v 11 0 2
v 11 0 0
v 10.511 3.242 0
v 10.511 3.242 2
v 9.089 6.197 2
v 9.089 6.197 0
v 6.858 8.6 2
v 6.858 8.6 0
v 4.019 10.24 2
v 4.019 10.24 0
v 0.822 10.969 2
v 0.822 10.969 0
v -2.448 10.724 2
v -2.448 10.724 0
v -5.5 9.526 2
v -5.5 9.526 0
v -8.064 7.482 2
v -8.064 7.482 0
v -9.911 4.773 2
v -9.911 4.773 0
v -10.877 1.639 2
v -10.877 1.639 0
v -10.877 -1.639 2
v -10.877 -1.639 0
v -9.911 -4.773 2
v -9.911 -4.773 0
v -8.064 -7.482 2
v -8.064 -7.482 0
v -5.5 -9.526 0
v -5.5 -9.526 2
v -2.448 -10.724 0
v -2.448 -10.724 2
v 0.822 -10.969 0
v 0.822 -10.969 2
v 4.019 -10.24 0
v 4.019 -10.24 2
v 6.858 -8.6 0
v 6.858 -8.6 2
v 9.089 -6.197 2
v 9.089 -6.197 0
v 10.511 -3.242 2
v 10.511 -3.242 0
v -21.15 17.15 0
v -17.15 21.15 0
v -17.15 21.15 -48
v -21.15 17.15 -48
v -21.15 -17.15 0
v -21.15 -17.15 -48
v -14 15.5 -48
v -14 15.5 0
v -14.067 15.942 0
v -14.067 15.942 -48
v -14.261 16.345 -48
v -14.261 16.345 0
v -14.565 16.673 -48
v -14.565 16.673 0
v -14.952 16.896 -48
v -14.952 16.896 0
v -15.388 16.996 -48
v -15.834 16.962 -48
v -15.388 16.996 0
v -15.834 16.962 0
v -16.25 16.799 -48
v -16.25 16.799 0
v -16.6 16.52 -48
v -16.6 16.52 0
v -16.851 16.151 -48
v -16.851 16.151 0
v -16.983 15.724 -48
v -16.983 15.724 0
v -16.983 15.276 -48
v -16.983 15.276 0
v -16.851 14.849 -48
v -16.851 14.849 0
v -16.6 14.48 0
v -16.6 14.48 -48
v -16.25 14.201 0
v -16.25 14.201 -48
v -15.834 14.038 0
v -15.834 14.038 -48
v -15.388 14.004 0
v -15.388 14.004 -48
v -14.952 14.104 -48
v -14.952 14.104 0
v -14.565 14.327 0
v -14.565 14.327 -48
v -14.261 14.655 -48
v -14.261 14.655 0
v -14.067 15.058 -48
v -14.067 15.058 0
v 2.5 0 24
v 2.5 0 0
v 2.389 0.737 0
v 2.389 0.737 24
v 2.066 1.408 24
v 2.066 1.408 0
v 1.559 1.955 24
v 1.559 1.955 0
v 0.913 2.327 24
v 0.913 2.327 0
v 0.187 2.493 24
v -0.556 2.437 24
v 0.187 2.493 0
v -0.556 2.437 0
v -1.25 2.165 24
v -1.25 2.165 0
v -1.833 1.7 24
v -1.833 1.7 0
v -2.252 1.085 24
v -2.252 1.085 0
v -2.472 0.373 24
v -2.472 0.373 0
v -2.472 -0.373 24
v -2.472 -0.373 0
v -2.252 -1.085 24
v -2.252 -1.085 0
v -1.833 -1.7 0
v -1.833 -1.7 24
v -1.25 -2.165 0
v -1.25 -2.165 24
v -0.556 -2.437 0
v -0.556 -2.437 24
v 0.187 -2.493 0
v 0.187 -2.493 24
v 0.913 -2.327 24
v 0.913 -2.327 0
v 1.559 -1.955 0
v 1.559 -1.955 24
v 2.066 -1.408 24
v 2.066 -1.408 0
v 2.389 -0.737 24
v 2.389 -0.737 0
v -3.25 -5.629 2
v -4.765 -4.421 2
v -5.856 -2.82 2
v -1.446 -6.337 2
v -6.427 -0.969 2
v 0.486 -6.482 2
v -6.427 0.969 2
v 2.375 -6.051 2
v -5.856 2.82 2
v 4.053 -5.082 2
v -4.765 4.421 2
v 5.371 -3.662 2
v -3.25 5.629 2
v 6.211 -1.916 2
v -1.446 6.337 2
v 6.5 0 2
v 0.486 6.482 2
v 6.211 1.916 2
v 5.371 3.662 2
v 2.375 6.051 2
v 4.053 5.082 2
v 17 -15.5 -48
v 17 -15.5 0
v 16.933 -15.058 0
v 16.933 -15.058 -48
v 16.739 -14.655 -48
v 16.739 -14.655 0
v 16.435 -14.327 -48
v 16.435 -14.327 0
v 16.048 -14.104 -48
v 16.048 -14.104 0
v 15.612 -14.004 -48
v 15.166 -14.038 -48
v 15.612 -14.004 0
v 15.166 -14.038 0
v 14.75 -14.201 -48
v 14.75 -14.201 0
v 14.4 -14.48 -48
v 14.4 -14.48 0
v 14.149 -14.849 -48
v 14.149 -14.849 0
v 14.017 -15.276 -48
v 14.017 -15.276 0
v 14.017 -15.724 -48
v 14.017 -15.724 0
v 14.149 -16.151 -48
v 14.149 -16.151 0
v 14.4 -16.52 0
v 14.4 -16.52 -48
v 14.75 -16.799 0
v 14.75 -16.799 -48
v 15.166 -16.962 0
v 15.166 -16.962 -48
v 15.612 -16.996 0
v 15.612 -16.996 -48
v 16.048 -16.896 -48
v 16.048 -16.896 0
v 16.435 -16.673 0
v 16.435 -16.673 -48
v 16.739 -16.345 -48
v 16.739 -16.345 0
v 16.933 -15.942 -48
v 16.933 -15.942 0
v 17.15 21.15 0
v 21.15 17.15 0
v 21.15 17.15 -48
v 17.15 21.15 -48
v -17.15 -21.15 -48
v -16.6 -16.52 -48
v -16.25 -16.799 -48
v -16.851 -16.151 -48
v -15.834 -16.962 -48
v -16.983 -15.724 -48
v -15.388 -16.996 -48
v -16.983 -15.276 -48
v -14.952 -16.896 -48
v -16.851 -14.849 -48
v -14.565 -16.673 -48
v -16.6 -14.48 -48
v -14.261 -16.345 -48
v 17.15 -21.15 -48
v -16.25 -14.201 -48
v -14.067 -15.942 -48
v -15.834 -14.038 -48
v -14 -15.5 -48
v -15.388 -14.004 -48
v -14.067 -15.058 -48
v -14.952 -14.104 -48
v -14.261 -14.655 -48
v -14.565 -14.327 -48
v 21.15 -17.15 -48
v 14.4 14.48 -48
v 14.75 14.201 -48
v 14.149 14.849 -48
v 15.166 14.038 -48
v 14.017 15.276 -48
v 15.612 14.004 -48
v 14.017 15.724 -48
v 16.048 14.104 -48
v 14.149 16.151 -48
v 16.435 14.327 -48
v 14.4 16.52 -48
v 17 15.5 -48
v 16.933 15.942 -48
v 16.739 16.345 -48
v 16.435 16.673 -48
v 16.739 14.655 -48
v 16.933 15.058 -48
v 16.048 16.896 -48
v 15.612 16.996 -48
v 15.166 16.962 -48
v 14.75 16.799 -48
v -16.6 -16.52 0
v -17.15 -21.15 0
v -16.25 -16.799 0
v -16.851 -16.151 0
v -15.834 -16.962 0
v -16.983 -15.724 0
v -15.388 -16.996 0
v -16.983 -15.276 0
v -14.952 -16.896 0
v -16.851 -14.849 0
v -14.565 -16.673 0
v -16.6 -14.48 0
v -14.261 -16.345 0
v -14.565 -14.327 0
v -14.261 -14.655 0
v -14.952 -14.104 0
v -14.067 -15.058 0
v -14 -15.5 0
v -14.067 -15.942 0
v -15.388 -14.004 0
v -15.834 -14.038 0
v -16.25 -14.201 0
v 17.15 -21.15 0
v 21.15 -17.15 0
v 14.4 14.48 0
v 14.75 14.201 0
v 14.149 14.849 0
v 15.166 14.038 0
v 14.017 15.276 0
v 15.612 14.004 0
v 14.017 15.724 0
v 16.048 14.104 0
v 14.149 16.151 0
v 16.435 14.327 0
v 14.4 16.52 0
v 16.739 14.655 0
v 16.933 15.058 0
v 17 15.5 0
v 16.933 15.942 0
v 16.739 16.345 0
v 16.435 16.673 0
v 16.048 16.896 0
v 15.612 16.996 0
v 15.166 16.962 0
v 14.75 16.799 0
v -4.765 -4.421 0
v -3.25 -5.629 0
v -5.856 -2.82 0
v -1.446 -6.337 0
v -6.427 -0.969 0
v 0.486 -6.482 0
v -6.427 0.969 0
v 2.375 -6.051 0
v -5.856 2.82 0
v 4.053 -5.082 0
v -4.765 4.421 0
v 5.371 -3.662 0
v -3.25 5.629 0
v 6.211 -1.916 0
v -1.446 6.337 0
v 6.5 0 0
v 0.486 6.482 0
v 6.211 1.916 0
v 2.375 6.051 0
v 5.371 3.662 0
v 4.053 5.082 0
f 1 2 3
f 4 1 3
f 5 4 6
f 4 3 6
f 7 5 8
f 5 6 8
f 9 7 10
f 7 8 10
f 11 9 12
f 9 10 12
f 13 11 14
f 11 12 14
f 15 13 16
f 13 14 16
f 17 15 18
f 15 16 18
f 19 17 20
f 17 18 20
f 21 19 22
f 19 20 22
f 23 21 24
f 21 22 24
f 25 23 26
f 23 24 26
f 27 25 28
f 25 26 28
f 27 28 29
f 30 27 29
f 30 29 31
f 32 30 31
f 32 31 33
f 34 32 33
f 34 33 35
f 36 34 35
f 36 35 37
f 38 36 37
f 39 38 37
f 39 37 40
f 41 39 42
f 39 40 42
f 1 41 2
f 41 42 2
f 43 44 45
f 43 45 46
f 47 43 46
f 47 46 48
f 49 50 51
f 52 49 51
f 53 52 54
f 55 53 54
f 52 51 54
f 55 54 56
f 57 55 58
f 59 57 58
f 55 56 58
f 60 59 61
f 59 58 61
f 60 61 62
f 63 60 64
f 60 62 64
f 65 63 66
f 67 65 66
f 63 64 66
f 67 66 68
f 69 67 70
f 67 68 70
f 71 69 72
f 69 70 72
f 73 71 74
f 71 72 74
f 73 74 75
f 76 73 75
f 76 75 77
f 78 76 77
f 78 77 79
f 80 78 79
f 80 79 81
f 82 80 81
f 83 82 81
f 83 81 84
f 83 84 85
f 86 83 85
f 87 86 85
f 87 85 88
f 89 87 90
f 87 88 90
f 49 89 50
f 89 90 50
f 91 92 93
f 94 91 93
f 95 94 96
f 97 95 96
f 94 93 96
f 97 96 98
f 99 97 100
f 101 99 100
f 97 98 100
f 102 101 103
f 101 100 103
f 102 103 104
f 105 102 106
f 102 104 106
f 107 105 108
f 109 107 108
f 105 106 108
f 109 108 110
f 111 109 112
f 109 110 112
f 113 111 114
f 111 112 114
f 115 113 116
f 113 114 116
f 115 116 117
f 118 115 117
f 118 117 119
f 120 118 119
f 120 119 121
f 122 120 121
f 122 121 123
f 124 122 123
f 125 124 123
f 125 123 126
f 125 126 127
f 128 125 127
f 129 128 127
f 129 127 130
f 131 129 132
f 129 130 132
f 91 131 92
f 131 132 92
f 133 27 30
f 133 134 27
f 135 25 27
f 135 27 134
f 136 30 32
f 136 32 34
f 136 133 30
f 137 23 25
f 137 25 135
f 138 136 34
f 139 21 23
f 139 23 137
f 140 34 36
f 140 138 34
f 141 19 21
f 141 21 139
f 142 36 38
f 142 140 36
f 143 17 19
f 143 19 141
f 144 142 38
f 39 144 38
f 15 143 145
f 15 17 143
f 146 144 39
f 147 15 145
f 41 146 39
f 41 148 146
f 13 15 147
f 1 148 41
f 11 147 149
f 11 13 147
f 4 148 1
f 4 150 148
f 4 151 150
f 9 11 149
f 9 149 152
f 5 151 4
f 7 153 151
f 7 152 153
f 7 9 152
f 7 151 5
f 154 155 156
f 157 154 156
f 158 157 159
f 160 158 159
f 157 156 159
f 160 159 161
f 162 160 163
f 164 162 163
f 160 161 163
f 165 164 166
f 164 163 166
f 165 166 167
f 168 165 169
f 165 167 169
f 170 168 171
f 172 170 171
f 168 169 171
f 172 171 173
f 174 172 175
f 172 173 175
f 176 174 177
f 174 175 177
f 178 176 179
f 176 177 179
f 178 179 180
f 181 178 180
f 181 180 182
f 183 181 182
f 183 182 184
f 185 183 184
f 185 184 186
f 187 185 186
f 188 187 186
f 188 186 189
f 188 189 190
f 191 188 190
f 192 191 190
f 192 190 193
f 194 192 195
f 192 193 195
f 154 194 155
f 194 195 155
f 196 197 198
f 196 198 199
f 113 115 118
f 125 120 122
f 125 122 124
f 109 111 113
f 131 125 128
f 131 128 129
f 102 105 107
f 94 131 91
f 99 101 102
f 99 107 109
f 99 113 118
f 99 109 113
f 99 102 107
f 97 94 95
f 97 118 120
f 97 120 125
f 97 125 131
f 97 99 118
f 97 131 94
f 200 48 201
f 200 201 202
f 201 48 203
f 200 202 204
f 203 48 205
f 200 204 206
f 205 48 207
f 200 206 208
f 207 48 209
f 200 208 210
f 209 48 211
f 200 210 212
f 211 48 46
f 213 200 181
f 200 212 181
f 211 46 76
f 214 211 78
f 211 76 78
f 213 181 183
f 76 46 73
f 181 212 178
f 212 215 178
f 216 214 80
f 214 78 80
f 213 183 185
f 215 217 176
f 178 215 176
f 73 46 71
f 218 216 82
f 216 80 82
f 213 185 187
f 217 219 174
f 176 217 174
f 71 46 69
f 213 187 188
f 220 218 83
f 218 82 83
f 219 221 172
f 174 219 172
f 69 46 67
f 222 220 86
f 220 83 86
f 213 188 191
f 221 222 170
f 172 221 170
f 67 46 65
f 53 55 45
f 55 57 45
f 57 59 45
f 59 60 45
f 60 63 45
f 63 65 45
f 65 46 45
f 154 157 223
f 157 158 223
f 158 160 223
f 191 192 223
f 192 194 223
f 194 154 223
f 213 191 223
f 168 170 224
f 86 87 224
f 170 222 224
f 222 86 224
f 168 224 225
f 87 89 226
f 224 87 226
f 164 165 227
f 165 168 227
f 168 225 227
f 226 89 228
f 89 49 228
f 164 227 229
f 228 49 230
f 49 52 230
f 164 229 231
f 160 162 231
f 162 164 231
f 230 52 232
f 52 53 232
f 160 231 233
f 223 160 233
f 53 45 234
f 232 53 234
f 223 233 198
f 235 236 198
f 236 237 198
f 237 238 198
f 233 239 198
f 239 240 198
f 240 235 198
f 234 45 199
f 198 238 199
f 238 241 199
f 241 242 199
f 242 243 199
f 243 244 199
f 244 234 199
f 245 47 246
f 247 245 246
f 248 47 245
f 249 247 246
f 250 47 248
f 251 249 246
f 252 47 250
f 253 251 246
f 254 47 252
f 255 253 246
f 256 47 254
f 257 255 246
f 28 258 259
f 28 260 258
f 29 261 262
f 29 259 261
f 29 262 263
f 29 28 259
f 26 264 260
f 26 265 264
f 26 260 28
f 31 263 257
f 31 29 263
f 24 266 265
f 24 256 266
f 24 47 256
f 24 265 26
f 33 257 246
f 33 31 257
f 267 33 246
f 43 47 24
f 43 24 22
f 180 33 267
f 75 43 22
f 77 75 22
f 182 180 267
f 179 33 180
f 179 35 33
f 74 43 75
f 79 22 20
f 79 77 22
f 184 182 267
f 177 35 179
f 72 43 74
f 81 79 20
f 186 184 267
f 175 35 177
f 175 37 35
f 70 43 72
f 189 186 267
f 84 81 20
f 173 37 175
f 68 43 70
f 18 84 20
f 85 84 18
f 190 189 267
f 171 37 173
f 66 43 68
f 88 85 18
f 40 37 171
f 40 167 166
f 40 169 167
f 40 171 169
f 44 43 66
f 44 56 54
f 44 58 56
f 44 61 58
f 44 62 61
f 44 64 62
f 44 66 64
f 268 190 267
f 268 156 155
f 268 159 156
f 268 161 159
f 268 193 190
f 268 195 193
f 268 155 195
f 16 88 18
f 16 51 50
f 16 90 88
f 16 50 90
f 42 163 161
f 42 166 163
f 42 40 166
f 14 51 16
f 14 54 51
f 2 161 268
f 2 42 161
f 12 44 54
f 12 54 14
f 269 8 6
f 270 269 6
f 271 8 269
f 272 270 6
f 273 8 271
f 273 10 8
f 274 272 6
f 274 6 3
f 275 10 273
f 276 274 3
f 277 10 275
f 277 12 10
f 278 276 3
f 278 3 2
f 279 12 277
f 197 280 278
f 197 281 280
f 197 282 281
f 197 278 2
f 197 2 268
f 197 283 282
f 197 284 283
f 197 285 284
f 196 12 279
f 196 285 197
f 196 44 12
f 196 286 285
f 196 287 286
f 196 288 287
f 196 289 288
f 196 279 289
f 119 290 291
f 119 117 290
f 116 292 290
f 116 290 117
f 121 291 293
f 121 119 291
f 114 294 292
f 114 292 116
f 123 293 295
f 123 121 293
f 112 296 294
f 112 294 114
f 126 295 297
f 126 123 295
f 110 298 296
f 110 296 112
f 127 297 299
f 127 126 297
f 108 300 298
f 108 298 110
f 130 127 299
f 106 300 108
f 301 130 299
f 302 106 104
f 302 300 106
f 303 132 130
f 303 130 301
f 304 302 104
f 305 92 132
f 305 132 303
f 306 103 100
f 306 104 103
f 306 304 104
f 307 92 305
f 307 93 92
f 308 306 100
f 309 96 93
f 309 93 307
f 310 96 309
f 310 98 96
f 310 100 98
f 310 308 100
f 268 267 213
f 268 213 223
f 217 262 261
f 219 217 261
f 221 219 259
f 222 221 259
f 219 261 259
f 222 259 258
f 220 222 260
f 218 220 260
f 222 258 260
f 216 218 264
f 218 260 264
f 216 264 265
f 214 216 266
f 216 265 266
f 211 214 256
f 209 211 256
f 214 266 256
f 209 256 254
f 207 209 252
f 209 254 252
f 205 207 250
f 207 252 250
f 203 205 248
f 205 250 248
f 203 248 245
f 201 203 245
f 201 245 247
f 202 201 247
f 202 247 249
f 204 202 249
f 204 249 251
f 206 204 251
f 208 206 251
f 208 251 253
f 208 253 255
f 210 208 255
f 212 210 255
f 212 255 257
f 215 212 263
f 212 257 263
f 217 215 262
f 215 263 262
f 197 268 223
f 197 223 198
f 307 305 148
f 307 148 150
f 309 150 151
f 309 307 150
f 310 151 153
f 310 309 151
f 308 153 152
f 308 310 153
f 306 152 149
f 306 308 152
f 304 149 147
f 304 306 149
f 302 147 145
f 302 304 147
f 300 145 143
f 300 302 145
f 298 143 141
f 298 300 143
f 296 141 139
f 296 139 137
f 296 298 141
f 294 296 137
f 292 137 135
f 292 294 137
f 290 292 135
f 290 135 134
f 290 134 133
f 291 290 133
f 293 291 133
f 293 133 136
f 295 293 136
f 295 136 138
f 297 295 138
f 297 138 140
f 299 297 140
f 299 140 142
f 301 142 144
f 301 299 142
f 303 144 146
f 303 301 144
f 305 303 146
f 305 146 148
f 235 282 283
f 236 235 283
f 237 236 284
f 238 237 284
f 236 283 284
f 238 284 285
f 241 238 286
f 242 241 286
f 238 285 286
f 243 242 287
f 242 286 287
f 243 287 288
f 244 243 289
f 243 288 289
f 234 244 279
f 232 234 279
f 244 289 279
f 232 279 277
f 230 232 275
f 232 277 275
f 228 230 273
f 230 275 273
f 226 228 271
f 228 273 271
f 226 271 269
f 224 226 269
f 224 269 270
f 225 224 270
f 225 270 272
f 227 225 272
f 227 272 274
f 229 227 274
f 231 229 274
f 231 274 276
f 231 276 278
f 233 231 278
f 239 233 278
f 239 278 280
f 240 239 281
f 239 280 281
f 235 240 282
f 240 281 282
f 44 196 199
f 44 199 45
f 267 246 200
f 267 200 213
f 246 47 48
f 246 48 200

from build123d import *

# Parameters (mm, degrees)
SKETCH004_R   = 1.5
PAD004_DEPTH  = 48
SKETCH005_R   = 11
SKETCH005_R_2 = 6.5
PAD005_DEPTH  = 2
SKETCH006_R   = 2.5
PAD006_DEPTH  = 24


with BuildPart() as part:
    # Sketch004 → Pad004 (new body)
    with BuildSketch(Plane.XY):
        Polygon((-21.15, 17.15), (-21.15, -17.15), (-17.15, -21.15), (17.15, -21.15), (21.15, -17.15), (21.15, 17.15), (17.15, 21.15), (-17.15, 21.15), align=None)
        with Locations((-15.5, 15.5)):
            Circle(SKETCH004_R, mode=Mode.SUBTRACT)
        with Locations((15.5, 15.5)):
            Circle(SKETCH004_R, mode=Mode.SUBTRACT)
        with Locations((15.5, -15.5)):
            Circle(SKETCH004_R, mode=Mode.SUBTRACT)
        with Locations((-15.5, -15.5)):
            Circle(SKETCH004_R, mode=Mode.SUBTRACT)
    extrude(amount=-PAD004_DEPTH)

    # Sketch005 (on Face13 of Pad004) → Pad005 (join)
    with BuildSketch(Plane.XY):
        Circle(SKETCH005_R)
        Circle(SKETCH005_R_2, mode=Mode.SUBTRACT)
    extrude(amount=PAD005_DEPTH)

    # Sketch006 (on Face18 of Pad005) → Pad006 (join)
    with BuildSketch(Plane.XY):
        Circle(SKETCH006_R)
    extrude(amount=PAD006_DEPTH)


solid = part.part
